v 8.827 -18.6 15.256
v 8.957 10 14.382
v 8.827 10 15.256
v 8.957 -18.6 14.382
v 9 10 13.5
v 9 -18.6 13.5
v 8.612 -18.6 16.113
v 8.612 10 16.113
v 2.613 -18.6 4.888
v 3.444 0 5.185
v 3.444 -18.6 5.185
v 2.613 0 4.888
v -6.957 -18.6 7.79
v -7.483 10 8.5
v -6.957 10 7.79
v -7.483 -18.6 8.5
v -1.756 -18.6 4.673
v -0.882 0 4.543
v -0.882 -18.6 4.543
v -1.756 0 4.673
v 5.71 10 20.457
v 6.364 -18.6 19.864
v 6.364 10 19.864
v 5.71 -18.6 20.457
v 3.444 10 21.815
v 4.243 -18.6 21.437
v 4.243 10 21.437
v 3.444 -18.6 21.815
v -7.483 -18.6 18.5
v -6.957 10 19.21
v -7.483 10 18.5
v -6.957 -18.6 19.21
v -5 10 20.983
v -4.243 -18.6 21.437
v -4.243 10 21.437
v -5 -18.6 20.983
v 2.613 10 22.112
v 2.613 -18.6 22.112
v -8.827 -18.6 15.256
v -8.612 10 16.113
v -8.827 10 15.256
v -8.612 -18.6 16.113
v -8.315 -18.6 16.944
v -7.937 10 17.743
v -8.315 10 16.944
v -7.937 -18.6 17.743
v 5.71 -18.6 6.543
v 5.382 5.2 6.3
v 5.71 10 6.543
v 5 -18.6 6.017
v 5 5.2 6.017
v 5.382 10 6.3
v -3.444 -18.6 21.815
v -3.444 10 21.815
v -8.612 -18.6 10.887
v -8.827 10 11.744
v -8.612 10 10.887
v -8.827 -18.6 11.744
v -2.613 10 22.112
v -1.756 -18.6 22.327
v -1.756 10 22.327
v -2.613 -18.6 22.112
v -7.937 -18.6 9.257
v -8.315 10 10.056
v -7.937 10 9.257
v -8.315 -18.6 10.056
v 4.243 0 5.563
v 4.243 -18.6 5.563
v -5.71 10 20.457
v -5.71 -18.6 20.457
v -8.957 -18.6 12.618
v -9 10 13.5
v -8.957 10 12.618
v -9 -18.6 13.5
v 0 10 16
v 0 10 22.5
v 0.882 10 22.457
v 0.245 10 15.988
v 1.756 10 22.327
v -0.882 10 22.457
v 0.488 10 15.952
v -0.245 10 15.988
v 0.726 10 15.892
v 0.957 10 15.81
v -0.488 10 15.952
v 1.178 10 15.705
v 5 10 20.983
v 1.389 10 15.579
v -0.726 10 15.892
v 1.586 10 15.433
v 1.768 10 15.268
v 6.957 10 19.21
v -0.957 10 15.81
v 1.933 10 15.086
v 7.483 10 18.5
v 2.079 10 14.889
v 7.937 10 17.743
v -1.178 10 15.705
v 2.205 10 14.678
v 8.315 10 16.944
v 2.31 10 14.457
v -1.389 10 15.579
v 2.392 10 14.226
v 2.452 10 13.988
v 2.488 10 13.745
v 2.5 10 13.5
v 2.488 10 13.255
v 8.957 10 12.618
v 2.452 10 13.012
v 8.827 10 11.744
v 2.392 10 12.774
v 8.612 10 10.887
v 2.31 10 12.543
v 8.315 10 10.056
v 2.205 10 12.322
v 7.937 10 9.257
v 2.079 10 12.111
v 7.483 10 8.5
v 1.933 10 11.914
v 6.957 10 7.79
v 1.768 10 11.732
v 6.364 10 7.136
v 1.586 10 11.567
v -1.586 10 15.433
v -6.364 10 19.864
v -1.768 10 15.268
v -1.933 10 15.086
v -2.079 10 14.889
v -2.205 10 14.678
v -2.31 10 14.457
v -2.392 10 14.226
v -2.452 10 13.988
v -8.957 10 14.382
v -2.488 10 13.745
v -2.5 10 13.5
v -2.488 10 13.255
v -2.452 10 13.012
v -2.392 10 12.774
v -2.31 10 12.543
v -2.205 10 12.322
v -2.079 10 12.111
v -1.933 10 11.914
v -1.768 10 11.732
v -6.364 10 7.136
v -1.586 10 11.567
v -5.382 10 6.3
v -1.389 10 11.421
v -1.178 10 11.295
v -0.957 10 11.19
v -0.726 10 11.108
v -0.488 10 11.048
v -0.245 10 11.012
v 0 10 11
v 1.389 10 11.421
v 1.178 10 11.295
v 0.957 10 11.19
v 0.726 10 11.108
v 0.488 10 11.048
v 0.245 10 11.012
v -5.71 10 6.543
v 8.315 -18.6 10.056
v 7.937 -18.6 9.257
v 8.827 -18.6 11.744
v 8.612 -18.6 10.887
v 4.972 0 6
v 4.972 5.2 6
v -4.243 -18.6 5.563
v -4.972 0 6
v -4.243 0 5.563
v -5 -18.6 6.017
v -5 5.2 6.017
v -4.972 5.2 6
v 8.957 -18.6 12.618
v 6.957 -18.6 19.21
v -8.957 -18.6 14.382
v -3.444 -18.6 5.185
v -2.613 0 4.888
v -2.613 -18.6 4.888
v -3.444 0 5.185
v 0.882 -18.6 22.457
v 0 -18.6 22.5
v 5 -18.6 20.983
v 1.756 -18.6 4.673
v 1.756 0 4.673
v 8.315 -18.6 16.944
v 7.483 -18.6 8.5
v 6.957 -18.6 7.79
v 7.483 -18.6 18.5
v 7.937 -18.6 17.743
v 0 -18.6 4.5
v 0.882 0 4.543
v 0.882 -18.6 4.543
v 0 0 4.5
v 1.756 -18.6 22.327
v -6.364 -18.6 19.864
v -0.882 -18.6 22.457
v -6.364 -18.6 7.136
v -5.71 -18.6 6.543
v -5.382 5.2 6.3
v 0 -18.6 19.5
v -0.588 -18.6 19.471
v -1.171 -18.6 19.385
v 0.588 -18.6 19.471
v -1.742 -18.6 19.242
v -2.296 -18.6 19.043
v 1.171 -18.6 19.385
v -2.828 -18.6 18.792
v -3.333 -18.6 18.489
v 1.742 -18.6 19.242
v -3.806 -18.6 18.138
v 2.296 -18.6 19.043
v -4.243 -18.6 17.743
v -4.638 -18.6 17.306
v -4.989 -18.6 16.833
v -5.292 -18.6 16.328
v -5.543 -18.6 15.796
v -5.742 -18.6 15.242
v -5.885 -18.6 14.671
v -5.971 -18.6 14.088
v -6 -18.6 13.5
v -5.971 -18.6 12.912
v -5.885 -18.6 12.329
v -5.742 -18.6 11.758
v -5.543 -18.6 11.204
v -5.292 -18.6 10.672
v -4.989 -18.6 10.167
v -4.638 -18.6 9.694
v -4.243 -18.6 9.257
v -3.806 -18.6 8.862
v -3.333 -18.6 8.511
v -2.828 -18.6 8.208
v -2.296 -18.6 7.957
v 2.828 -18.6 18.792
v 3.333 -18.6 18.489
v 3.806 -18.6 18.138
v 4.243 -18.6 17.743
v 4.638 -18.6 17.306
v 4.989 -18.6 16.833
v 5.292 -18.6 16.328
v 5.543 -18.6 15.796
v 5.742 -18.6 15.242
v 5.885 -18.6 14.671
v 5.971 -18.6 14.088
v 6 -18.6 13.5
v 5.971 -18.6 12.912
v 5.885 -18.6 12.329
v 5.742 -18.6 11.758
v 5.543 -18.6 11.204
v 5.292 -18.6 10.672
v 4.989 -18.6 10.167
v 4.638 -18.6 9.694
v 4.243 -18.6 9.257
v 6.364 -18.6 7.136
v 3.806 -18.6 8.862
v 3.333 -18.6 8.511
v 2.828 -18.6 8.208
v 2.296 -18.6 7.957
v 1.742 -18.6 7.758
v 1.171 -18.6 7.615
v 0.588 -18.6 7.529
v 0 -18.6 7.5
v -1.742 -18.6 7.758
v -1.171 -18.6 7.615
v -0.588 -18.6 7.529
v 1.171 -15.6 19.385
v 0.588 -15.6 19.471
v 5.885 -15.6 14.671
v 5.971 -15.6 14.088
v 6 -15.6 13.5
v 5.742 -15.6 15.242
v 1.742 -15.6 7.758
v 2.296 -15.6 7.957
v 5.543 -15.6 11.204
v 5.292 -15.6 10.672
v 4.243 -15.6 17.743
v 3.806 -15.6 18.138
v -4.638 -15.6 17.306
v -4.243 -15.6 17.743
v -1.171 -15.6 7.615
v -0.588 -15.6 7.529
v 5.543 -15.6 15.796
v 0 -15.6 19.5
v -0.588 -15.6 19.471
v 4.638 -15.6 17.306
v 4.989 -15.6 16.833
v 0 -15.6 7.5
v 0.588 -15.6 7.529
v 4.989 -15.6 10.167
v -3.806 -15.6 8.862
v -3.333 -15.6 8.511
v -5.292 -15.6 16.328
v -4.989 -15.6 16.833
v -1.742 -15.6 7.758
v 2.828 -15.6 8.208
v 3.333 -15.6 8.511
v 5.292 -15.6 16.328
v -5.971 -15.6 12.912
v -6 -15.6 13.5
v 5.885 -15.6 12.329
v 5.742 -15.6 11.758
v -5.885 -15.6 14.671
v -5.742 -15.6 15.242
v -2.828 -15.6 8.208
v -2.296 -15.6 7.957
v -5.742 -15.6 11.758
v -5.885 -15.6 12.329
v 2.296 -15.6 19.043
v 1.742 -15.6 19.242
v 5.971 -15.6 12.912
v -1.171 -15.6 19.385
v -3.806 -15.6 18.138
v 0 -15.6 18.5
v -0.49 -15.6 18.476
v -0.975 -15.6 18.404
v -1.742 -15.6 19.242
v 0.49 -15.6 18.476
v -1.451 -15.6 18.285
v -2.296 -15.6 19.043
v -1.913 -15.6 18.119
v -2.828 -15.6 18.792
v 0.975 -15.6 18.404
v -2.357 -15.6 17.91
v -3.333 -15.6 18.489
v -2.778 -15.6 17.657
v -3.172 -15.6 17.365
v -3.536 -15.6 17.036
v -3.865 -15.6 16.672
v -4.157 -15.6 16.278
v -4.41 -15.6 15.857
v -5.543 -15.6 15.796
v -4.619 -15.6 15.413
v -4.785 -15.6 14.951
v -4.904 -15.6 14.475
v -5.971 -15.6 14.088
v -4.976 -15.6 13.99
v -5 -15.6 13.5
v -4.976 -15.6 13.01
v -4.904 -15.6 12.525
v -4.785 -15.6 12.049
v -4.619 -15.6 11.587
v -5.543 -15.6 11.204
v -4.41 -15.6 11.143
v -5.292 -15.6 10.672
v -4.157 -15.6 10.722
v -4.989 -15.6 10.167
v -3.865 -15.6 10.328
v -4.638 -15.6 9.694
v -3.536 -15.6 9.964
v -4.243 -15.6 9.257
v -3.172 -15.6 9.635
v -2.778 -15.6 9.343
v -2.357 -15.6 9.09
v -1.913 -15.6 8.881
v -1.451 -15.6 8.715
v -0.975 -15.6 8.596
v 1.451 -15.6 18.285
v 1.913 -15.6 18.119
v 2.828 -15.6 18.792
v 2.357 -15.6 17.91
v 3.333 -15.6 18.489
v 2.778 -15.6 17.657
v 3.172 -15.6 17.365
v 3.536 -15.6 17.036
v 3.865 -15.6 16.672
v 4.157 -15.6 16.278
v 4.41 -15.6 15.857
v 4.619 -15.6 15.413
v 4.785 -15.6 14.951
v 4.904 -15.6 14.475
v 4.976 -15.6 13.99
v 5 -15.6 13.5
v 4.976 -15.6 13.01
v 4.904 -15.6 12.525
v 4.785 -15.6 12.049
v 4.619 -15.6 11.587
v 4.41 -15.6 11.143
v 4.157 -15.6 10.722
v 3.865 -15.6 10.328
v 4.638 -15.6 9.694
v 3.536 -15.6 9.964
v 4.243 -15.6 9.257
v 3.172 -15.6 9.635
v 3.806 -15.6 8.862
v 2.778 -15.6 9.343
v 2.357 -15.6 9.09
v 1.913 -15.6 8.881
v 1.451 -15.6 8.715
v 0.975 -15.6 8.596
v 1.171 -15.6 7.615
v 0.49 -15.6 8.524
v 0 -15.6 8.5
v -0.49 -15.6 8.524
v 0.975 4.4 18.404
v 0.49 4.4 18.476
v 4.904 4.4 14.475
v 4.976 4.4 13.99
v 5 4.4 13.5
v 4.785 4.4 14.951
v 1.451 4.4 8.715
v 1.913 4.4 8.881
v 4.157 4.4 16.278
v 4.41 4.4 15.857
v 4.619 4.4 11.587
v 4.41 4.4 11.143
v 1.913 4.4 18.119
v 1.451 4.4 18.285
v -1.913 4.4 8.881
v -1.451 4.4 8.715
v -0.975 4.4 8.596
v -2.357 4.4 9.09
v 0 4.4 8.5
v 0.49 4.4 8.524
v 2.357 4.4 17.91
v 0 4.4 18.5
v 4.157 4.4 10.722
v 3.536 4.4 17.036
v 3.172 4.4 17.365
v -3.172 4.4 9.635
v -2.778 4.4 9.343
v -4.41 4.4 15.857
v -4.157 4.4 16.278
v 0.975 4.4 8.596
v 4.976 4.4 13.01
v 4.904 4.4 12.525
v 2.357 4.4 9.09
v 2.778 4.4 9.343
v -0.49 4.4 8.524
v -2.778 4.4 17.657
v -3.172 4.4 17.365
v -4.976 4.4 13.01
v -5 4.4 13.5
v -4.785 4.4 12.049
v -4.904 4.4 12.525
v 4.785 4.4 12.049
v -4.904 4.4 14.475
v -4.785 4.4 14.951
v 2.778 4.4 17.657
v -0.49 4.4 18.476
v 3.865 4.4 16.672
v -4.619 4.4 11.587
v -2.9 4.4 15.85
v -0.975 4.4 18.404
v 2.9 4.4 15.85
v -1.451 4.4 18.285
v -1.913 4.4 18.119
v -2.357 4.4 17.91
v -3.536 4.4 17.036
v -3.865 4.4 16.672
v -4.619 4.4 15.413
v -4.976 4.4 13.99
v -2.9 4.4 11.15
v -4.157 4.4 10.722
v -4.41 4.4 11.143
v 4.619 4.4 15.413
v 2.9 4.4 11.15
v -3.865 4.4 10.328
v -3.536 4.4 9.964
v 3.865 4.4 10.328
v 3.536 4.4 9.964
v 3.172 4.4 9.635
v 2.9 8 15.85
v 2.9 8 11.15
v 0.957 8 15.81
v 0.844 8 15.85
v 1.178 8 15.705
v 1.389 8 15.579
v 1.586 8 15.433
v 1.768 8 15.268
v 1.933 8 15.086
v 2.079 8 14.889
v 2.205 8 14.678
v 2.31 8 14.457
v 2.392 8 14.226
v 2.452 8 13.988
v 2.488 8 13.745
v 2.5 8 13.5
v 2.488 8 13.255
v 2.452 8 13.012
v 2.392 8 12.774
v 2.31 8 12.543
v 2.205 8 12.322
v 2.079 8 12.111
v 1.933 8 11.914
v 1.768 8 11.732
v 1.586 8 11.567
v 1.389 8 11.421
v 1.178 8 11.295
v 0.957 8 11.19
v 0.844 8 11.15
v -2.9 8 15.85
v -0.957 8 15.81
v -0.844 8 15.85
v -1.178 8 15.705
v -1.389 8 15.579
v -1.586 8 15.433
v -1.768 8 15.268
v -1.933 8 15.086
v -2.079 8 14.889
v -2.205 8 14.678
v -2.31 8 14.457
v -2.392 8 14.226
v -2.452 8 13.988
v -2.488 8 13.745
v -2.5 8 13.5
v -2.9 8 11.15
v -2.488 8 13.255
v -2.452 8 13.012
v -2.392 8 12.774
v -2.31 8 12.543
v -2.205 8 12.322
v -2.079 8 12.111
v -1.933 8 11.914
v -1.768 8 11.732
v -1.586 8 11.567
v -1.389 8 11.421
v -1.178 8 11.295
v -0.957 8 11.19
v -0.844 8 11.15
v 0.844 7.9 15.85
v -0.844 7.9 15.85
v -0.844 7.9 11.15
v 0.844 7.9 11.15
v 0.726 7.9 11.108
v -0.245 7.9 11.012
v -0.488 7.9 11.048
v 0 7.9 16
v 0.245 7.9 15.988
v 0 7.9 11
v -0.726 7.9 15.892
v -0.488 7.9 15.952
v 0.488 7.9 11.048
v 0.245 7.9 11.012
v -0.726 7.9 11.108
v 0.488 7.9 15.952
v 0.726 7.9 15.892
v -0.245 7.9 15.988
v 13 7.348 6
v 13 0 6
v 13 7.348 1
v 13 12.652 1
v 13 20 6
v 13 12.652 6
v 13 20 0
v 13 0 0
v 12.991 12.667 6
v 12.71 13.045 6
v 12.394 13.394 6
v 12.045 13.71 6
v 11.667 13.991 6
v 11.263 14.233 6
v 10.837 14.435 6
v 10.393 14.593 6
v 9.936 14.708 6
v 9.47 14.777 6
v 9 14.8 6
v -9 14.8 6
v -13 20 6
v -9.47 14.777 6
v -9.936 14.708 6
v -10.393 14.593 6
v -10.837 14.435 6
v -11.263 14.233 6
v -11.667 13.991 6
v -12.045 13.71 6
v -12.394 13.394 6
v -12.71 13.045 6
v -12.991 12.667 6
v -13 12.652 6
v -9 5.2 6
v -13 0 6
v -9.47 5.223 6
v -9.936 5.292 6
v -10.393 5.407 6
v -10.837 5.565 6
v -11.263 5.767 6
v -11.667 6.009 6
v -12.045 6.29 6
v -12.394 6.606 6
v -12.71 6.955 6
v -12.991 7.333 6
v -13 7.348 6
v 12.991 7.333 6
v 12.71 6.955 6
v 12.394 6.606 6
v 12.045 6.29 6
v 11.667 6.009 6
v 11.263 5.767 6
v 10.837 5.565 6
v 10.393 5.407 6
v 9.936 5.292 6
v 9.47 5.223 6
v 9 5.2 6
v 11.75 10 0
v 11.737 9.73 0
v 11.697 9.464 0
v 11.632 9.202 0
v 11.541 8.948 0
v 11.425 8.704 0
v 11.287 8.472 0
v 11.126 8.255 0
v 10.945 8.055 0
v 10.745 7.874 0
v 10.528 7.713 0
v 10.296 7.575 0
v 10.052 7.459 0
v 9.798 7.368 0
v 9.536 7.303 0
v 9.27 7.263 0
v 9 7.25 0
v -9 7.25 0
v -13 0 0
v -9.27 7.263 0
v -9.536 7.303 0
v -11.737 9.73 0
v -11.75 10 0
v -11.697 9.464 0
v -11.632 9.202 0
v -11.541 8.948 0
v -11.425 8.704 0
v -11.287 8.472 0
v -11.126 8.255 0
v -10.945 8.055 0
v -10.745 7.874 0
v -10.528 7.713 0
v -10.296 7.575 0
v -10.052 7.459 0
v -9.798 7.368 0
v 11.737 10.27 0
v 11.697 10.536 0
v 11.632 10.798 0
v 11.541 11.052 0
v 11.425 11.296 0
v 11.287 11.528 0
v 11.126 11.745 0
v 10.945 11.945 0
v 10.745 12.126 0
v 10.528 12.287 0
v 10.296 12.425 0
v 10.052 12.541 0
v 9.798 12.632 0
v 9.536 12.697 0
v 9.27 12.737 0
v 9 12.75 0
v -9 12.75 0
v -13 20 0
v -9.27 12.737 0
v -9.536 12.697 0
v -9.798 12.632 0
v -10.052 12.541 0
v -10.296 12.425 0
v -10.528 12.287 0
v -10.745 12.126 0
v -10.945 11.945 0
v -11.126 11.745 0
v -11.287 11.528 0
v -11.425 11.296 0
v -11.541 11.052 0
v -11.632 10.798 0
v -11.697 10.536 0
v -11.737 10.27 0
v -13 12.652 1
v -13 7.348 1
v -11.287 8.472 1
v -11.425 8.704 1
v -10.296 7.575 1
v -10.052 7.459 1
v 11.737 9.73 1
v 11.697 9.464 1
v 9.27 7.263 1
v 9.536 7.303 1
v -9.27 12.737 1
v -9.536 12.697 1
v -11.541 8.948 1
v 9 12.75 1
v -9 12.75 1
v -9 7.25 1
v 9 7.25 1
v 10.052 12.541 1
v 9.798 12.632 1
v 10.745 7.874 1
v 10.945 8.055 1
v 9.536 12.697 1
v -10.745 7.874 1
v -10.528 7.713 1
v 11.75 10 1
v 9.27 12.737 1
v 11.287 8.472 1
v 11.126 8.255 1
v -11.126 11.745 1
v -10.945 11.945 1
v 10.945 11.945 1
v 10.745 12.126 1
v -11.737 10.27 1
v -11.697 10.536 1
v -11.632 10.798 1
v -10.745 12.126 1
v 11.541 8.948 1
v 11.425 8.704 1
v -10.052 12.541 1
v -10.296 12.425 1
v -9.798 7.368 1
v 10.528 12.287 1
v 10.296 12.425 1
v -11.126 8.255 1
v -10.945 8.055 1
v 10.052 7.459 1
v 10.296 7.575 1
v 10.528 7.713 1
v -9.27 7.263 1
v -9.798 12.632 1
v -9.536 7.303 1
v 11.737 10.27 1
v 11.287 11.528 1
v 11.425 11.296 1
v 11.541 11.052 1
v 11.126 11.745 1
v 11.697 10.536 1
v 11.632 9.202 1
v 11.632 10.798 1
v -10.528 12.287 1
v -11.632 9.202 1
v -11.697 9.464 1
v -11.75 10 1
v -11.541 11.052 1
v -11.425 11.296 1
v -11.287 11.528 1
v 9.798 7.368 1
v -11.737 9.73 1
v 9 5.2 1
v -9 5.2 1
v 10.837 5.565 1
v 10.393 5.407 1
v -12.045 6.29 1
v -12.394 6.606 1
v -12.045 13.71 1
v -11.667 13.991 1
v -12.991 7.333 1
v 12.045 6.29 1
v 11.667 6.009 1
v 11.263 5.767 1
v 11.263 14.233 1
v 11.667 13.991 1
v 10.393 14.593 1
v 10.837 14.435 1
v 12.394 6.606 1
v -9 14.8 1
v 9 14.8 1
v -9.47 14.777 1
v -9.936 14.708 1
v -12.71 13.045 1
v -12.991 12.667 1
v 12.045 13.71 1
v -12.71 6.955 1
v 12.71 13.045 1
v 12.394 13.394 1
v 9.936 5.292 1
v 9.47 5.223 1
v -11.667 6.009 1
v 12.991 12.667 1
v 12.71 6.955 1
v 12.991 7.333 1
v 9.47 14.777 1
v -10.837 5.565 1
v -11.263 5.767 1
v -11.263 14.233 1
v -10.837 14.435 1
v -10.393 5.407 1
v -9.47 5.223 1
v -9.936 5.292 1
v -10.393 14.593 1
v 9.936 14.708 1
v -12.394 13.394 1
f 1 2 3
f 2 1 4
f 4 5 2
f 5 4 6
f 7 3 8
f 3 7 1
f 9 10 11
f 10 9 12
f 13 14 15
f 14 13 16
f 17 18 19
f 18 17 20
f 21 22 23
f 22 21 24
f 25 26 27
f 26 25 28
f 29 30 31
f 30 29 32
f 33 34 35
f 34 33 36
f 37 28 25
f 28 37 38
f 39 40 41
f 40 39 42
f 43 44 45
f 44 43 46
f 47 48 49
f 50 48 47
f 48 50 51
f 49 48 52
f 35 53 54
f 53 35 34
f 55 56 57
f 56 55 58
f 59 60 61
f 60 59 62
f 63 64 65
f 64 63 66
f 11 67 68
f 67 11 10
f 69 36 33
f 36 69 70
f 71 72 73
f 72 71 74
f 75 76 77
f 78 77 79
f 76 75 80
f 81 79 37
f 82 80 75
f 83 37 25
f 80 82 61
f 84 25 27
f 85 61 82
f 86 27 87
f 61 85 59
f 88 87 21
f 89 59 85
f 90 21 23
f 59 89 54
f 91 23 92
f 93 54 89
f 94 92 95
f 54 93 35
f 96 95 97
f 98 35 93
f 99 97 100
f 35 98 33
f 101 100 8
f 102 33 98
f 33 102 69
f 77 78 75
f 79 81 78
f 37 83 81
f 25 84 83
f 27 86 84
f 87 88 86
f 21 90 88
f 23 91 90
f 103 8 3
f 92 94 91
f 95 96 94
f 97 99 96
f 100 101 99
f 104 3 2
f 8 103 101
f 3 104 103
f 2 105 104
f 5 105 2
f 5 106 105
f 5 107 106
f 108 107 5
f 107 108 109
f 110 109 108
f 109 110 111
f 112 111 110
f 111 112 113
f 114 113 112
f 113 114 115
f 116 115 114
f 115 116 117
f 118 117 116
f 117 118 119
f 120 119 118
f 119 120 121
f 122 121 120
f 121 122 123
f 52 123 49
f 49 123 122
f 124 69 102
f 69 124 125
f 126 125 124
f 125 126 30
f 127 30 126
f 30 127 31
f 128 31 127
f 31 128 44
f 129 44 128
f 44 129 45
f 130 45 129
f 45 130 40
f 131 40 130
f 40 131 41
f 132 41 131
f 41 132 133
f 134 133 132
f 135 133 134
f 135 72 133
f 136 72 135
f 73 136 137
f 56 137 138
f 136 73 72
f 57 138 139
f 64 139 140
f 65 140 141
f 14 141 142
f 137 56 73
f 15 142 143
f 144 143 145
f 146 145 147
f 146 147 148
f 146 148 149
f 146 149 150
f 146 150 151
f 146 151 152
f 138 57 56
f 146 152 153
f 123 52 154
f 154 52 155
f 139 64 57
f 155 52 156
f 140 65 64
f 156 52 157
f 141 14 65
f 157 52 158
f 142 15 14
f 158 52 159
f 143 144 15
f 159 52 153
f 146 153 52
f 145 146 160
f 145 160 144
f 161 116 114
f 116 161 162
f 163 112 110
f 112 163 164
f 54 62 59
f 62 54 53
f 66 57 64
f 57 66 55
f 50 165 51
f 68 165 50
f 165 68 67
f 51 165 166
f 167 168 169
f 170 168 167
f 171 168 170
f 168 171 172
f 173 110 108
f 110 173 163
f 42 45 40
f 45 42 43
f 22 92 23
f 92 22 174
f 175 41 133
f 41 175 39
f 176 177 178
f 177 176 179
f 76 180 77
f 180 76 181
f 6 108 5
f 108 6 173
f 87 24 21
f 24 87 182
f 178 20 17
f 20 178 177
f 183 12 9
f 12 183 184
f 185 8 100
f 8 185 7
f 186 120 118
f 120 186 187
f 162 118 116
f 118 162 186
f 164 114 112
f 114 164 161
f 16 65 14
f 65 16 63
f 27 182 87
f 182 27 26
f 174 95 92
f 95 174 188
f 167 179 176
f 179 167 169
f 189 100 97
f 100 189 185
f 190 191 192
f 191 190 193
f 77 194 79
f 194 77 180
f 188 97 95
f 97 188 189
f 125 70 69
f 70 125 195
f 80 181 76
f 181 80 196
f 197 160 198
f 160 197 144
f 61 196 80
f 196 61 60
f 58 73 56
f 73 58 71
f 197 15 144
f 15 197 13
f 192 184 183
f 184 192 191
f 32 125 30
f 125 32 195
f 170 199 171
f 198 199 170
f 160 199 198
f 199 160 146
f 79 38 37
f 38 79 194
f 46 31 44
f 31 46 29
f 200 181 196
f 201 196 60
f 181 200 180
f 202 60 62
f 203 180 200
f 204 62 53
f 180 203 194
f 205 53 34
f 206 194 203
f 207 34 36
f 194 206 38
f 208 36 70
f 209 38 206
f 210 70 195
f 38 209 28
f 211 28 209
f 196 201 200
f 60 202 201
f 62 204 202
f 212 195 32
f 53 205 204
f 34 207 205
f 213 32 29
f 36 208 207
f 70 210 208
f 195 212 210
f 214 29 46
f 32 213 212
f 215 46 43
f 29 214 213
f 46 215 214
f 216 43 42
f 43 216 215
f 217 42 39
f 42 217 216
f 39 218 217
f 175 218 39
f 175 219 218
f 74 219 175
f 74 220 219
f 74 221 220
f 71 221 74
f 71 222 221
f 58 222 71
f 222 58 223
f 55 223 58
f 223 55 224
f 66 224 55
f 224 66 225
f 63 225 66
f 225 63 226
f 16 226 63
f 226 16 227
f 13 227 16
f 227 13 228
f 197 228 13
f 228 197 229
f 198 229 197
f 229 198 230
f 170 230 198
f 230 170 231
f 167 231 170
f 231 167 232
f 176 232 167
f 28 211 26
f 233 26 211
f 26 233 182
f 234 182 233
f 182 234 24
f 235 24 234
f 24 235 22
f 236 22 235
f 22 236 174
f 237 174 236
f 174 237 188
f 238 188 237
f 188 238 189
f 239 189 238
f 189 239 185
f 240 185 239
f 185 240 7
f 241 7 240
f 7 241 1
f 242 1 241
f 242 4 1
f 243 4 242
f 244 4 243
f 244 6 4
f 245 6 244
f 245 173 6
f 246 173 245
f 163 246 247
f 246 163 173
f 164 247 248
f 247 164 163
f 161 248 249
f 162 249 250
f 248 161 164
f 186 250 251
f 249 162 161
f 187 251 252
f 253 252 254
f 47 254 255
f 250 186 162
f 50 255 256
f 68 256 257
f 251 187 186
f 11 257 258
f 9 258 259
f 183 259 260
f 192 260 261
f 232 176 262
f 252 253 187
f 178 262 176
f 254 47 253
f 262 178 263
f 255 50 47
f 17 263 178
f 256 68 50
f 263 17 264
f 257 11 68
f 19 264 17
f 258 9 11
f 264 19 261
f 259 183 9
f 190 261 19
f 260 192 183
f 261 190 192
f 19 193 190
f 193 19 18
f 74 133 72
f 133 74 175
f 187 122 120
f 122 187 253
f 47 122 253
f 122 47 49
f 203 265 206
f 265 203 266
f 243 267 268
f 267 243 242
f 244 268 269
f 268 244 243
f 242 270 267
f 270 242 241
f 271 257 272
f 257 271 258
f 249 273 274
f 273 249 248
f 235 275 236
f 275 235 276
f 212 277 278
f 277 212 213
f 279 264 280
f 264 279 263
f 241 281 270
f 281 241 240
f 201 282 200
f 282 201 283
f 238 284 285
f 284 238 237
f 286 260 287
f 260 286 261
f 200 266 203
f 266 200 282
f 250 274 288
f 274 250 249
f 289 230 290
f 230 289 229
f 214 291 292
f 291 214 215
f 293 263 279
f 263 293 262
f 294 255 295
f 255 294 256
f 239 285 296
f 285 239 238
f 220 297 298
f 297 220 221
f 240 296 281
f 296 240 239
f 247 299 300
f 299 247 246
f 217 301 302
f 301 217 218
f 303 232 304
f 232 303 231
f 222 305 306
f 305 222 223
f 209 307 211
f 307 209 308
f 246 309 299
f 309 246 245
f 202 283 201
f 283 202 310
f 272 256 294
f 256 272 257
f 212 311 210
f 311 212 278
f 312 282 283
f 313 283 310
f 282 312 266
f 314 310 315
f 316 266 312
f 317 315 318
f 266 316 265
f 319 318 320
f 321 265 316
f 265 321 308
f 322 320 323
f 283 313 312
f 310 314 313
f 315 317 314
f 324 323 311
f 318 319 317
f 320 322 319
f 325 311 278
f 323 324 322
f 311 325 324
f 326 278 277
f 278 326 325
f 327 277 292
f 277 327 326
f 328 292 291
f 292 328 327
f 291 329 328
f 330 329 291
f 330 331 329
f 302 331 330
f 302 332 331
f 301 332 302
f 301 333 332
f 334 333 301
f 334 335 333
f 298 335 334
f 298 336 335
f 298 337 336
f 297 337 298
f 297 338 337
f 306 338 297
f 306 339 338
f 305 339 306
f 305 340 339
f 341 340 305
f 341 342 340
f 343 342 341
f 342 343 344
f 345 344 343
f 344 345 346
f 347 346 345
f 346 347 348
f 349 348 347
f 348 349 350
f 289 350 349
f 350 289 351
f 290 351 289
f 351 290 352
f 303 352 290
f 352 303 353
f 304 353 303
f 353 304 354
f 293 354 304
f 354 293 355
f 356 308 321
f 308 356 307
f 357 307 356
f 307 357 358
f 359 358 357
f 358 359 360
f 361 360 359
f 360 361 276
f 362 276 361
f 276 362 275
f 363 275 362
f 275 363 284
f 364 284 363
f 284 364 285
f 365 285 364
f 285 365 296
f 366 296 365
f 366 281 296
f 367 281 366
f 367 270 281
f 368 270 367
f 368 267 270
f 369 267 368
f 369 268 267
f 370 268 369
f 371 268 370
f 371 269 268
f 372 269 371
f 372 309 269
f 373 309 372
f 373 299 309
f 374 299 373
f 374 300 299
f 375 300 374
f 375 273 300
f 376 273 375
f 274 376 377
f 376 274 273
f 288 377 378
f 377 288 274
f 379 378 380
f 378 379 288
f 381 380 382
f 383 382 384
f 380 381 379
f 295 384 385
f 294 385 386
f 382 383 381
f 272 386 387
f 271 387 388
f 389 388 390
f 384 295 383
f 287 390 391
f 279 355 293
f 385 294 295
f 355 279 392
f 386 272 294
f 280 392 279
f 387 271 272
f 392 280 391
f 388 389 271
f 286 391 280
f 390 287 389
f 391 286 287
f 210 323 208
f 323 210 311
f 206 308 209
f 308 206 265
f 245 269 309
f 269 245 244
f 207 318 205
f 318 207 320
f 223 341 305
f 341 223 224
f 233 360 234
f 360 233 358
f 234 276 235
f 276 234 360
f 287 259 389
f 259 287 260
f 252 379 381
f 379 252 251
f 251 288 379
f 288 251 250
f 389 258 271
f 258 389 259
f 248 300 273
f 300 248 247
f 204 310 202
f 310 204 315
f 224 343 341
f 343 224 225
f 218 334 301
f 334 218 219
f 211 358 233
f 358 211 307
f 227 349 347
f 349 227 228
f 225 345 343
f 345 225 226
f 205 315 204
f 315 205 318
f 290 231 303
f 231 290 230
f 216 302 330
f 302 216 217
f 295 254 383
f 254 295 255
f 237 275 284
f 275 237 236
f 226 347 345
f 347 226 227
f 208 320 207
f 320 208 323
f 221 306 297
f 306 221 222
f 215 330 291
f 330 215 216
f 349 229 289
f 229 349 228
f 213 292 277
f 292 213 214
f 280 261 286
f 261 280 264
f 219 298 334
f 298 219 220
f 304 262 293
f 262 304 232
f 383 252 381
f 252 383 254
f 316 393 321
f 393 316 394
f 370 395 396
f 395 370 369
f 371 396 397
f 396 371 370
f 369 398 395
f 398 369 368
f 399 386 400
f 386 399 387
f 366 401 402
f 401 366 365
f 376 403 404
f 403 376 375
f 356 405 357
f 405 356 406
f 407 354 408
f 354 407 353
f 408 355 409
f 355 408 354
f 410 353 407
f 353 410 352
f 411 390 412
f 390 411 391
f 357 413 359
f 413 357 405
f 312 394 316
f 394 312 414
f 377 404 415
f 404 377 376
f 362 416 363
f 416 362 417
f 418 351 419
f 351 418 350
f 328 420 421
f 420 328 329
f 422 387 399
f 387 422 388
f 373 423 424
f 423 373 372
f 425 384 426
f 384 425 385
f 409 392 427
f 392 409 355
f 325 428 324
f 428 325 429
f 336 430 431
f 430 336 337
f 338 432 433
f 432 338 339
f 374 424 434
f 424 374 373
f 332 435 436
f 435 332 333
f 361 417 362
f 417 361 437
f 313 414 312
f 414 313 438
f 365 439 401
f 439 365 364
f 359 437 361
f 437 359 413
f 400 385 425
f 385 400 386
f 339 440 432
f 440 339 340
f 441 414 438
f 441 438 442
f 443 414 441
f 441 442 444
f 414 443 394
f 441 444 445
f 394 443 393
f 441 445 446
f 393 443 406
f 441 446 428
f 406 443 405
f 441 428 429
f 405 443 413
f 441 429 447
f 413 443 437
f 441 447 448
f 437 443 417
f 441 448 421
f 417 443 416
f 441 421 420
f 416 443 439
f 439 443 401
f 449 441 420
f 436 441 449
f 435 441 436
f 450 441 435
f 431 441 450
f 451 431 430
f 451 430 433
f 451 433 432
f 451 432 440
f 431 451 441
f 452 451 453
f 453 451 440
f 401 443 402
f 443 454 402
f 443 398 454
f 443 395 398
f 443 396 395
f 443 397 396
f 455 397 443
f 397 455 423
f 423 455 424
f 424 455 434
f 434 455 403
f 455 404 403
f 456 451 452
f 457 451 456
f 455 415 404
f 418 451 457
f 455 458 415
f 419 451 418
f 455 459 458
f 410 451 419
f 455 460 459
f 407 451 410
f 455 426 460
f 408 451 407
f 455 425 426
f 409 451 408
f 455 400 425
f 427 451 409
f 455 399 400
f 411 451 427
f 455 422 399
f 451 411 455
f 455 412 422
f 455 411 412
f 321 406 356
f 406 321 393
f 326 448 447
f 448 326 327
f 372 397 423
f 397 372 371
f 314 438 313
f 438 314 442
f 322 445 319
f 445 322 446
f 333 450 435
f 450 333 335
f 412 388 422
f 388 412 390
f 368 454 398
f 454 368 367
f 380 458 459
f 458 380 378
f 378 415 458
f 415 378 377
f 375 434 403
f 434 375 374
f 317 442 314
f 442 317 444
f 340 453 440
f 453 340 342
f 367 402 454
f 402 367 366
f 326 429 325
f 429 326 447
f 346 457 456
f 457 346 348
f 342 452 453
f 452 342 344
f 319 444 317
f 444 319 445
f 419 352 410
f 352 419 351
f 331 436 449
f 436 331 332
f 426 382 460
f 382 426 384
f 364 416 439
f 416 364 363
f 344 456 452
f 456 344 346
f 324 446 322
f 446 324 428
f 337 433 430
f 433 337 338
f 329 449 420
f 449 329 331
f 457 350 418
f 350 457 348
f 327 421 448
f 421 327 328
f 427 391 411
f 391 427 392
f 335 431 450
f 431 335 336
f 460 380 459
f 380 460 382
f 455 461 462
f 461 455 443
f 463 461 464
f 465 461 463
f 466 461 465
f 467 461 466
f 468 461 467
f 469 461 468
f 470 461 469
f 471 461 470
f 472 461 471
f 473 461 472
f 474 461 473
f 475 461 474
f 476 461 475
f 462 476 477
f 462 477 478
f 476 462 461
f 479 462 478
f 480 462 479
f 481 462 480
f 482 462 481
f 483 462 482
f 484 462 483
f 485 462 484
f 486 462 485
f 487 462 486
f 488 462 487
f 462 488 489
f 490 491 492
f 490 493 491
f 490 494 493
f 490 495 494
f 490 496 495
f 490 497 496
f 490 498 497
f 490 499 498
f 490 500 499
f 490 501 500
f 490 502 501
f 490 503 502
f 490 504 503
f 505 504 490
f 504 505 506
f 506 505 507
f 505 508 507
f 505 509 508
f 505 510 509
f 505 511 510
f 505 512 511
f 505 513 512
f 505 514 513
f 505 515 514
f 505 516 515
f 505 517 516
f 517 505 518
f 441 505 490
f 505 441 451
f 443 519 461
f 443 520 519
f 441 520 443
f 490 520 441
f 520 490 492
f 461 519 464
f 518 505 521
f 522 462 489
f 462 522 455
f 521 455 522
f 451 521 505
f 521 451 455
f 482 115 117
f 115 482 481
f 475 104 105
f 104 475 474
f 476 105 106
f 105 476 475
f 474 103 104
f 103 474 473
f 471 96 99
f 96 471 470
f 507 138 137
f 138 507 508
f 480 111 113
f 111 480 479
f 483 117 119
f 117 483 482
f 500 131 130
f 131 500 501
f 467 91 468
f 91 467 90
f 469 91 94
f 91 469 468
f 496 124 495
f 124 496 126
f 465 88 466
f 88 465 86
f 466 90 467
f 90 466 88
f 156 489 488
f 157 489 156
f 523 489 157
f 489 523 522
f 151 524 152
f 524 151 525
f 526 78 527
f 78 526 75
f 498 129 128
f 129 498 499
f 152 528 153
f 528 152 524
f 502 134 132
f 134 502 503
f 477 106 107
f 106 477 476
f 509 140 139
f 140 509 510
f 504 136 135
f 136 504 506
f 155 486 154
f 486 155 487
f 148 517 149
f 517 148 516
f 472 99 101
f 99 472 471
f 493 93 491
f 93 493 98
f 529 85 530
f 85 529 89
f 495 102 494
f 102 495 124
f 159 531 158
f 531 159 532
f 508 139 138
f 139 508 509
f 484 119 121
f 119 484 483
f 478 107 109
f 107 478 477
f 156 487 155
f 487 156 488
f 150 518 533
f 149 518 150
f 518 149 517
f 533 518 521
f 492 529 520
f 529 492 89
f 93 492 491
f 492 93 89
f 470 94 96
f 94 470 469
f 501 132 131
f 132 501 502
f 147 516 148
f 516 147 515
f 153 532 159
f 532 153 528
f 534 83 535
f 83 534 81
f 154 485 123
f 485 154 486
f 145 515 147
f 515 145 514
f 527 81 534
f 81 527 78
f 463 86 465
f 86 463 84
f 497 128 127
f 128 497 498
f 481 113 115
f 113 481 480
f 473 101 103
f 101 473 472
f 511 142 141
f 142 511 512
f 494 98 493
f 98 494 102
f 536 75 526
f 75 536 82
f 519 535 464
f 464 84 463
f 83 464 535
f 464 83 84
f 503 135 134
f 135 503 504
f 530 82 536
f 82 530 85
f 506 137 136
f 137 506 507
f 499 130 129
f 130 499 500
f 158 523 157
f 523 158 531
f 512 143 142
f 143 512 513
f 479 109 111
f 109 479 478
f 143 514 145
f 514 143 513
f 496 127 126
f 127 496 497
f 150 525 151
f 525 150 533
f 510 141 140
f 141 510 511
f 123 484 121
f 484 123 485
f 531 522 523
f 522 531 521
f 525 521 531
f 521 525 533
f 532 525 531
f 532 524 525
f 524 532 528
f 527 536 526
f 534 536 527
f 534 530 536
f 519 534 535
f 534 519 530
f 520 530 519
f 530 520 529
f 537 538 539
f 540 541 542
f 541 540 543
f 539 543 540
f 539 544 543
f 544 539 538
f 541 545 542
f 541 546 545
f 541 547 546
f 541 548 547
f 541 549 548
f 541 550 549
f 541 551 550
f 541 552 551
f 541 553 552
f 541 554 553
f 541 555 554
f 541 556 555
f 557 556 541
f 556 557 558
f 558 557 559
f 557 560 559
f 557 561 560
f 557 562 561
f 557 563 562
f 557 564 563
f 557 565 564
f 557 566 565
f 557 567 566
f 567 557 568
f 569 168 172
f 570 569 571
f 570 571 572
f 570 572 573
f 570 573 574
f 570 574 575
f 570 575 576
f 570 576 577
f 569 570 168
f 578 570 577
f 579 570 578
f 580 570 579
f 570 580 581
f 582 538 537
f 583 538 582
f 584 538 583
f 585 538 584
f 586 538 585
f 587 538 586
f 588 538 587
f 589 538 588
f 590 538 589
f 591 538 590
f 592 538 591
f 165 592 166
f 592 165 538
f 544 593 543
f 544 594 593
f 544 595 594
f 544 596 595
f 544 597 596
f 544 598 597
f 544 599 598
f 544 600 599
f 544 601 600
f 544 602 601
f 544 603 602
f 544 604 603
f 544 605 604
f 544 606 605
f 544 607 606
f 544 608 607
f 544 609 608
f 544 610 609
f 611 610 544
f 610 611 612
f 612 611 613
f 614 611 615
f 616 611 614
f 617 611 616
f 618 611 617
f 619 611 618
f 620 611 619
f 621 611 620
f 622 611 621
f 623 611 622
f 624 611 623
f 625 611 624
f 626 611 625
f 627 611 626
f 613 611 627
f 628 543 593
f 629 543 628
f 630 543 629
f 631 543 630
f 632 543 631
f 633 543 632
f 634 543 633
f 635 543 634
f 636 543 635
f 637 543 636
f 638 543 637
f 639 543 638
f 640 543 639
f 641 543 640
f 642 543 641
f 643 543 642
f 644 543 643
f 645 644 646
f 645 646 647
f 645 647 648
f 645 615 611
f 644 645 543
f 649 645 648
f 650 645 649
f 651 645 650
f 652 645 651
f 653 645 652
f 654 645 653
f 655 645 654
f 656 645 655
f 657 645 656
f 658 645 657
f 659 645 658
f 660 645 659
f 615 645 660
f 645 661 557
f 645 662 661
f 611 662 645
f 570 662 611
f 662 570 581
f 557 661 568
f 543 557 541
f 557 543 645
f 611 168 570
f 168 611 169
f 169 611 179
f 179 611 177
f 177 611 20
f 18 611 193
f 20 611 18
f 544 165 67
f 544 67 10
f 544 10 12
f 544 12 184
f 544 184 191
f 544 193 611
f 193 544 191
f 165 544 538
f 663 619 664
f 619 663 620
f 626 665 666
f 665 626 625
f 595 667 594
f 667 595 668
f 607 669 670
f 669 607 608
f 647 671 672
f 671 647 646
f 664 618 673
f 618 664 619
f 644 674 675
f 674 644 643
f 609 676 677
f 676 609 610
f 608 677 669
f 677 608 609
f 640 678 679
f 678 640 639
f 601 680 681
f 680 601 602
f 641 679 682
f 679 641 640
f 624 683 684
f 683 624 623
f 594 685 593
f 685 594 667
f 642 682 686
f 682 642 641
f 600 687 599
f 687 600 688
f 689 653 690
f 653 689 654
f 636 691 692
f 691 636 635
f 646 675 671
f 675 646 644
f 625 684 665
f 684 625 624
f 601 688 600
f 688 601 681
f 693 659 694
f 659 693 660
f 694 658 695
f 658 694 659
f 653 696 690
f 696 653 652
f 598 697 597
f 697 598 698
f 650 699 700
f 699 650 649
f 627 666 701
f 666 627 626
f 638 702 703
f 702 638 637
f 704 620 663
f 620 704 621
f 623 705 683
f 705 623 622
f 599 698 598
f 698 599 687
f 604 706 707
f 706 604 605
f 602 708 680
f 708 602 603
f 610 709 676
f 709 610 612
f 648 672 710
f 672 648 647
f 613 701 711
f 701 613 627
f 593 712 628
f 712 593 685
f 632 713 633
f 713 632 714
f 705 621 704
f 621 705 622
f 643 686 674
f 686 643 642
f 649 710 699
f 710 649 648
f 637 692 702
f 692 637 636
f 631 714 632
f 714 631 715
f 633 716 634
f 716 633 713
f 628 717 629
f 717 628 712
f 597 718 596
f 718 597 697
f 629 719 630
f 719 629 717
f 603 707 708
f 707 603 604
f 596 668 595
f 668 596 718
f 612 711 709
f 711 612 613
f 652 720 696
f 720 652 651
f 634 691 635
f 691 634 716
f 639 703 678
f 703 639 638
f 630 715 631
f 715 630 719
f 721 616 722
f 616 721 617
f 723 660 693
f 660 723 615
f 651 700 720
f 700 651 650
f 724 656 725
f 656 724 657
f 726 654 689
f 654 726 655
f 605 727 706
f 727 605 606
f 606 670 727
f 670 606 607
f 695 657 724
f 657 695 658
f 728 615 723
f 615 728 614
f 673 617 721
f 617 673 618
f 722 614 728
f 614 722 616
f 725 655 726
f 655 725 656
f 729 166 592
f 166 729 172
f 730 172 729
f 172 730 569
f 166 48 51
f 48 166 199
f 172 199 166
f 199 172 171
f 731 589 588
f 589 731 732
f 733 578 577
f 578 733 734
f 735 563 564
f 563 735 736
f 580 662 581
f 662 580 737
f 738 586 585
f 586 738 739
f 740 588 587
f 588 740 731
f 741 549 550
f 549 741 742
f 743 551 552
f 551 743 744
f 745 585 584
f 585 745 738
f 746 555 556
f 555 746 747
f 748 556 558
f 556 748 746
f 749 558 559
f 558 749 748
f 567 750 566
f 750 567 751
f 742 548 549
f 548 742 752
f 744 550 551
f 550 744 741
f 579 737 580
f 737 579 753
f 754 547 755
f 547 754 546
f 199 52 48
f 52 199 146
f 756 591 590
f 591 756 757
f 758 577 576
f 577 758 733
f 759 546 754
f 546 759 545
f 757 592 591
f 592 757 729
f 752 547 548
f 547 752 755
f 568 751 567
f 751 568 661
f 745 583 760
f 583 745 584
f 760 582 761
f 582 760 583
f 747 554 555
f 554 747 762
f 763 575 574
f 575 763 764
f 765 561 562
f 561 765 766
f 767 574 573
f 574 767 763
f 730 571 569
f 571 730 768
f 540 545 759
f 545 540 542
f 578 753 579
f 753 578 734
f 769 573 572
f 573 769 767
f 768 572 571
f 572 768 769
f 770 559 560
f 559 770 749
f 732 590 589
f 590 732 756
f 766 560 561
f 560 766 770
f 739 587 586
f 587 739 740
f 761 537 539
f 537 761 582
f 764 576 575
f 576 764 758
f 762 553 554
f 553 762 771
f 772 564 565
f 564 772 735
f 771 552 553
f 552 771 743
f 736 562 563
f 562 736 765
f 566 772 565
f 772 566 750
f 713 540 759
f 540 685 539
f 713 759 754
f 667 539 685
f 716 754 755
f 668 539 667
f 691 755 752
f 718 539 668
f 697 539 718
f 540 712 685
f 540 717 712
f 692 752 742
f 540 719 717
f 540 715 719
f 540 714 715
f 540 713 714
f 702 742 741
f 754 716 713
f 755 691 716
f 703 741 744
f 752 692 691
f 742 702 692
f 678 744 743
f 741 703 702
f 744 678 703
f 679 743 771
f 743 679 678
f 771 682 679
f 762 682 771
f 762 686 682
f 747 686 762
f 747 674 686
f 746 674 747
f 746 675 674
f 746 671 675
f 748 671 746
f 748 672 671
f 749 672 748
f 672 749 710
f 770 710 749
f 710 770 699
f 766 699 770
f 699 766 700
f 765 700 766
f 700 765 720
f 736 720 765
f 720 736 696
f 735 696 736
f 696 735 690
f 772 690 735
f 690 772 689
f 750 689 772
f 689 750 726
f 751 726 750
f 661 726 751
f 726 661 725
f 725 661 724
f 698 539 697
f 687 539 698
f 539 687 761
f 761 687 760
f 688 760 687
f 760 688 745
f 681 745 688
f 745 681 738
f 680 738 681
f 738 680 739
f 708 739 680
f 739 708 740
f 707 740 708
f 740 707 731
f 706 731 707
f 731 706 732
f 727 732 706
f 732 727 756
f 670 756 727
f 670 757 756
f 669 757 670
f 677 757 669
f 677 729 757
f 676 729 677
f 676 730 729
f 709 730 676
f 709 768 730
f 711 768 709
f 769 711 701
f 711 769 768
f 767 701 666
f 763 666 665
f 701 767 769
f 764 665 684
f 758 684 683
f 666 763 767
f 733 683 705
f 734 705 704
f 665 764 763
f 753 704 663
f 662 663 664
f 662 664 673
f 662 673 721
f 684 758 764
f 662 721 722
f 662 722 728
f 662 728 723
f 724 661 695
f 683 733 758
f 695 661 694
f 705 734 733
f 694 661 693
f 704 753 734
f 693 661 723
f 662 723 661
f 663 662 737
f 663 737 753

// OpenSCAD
// file: params.scad
// =============================================================================
//  BUGLOCK printed-bracket parameters
//  Every structural number here traces to docs/laser-fly-turret-design.md §4.5.
//  Units: millimetres. Target printer: Bambu Lab P1S (256^3 bed, enclosed).
//  Material: PETG minimum, ASA preferred near the laser.  NEVER PLA (§4.5 C3).
// =============================================================================

$fn = 64;                 // curve smoothness for render/export

// ---- general print process (P1S, 0.4 mm nozzle) --------------------------
wall        = 3.2;        // ~8 perimeters — stiffness governs, not strength
gen_clr     = 0.20;       // clearance between mating printed features

// ---- 2020 / 2040 aluminum extrusion interface ----------------------------
ext_w       = 20;         // 2020 profile face width (rail top the foot sits on)
m5_clear    = 5.5;        // clearance hole for an M5 bolt into a T-nut
m5_head     = 9.6;        // M5 socket-head cap dia (counterbore)
m5_head_h   = 5.0;        // M5 head height (counterbore depth)

// ---- heat-set brass inserts (melt-in hole diameters) ---------------------
// Verify against YOUR inserts; these are typical for CNC Kitchen / generic.
ins_m2_d    = 3.2;  ins_m2_h = 4.0;
ins_m3_d    = 4.0;  ins_m3_h = 6.0;
ins_m4_d    = 5.7;  ins_m4_h = 8.0;

// =============================================================================
//  GALVO PAD  — §4.5 Constraint 1 (static stiffness)
//  Cantilever calc: slope theta = P*L^2/(2*E*I), I = b*h^3/12, so theta ~ 1/h^3.
//  Under the ~4 N scanner block a >=12 mm pad flexes ~0.35 mrad (vs 1.17 mrad at
//  8 mm) — inside the 0.5 mrad frame budget. The pad is a SHORT SOLID pedestal
//  (load in compression, short moment arm), not a slender arm.
// =============================================================================
galvo_ped_h      = 16;    // pedestal height — keep SHORT (short moment arm)
galvo_ped_h_max  = 20;    // do not exceed: taller = longer lever = more drift
galvo_pad_t_min  = 12;    // informational: min effective load-path thickness

// Footprint of YOUR galvo scanner block — MEASURE and edit these two:
galvo_block_w    = 66;    // block width  (X)
galvo_block_d    = 40;    // block depth  (Y)

// Galvo block bolt pattern — MEASURE your kit (most 20-30 kpps sets are M4):
galvo_bolt_dx    = 50;    // bolt spacing across X
galvo_bolt_dy    = 28;    // bolt spacing across Y
galvo_bolt_ins   = ins_m4_d;
galvo_bolt_ins_h = ins_m4_h;

galvo_margin     = 11;    // pad border beyond the block (room for hold-downs)
galvo_hold_edge  = 7;     // hold-down bolt inset from the pad edge
cable_slot_w     = 12;    // cable relief channel width
cable_slot_h     = 5;     // cable relief channel height (from base up)

// =============================================================================
//  CAMERA MOUNT — §4.5 Constraint 2 & 4
//  Baseline (60 mm) is carried on the ALUMINUM rail, not plastic: the foot has a
//  SLOT so you slide each camera to an exact baseline, then lock it. Print two.
//  PCB is captured in a lipped pocket (a datum) so it re-seats repeatably.
// =============================================================================
// Raspberry Pi Camera v2 (IMX219) board — MEASURE yours; boards vary slightly:
cam_pcb_w        = 25.0;
cam_pcb_h        = 24.0;
cam_pcb_t        = 1.6;
cam_pocket_clr   = 0.35;  // pocket oversize so the PCB drops in cleanly

cam_lip_w        = 3.0;   // pocket wall/lip width around the PCB
cam_lip_front    = 2.0;   // front retaining lip that traps the PCB
cam_window_d     = 16.0;  // front opening — clears the lens & its field of view
cam_ribbon_w     = 17.0;  // FFC ribbon exit slot at the pocket bottom

cam_foot_len     = 40;    // foot length along the rail (X)
cam_base_t       = 6;     // foot thickness
cam_plate_t      = 6;     // vertical plate thickness (>= ins_m2_h so inserts fit)
cam_plate_h      = 40;    // vertical plate height
cam_plate_w      = 34;    // vertical plate width

cam_slot_len     = 30;    // baseline-adjust travel (slotted foot hole)
cam_toe_in_deg   = 0;     // 0 = parallel optics (rectified stereo). small toe ok
cam_use_screws   = true;  // M2 heat-set inserts to bolt the PCB down
cam_hole_dx      = 21;    // PCB mount-hole horizontal spacing — MEASURE yours
cam_hole_dz      = 0;     // vertical offset of the mount holes from pocket center

cam_center_z     = cam_base_t + cam_plate_h / 2;   // PCB centre height (derived)

// =============================================================================
//  ELECTRONICS TRAY — holds the Jetson Orin Nano + the MCP4922/op-amp protoboard
//  Not stiffness-critical (no optics on it), so it's a light plate with standoff
//  bosses. Bolts to the frame with M5 T-nut bolts. MEASURE your board hole
//  patterns — the Jetson dev-kit pattern below is nominal.
// =============================================================================
tray_w           = 172;   // tray plate width  (X)
tray_d           = 108;   // tray plate depth  (Y)
tray_t           = 4;     // tray plate thickness
tray_standoff_h  = 6;     // standoff height (clears solder/leads under boards)
tray_standoff_d  = 7.5;   // standoff outer diameter
tray_edge        = 9;     // frame-bolt inset from the tray edge

// Jetson Orin Nano dev-kit carrier mounting holes (nominal — MEASURE yours):
tray_jetson_dx   = 86;    // hole spacing X
tray_jetson_dy   = 58;    // hole spacing Y
tray_jetson_cx   = -34;   // pattern centre offset on the tray (X)
tray_jetson_ins  = ins_m3_d;
tray_jetson_ins_h= ins_m3_h;

// Aux protoboard (MCP4922 DAC + op-amp level-shift) mounting holes:
tray_aux_dx      = 45;
tray_aux_dy      = 35;
tray_aux_cx      = 56;    // pattern centre offset on the tray (X)
tray_aux_ins     = ins_m3_d;
tray_aux_ins_h   = ins_m3_h;

// =============================================================================
//  PHOTODIODE / LENS HOLDER — the wing-beat sensor front-end (§3.2)
//  A short barrel: a collecting lens up front, the photodiode at its focal
//  distance behind it, on a slotted foot that clamps to the rail and aims at the
//  detection volume. Optics are cheap and non-critical — this just gathers flux.
// =============================================================================
pd_lens_od       = 12.0;  // collecting lens outer diameter (MEASURE)
pd_lens_t        = 3.0;   // lens seat depth (front counterbore)
pd_focal         = 20.0;  // lens focal length ≈ lens-to-photodiode distance
pd_barrel_wall   = 3.0;   // barrel wall thickness
pd_body_w        = 5.8;   // BPW34 body pocket width  (MEASURE)
pd_body_h        = 4.7;   // BPW34 body pocket height
pd_body_t        = 3.6;   // BPW34 body pocket depth
pd_lead_d        = 5.0;   // rear clearance for leads / wiring
pd_foot_len      = 26;    // foot length along the rail
pd_base_t        = 6;     // foot thickness
pd_slot_len      = 18;    // aim-position adjust travel on the rail
pd_aim_deg       = 0;     // barrel tilt toward the volume (0 = level, -Y look)
// main file
// =============================================================================
//  BUGLOCK — photodiode / lens holder  (wing-beat sensor front-end, §3.2)
//  A short barrel: a collecting lens seats in the front, the BPW34 photodiode
//  sits at the lens focal distance behind it, on a slotted foot that clamps to
//  the rail and aims at the detection volume (lens looks down the -Y axis).
//  Optics are cheap and non-critical — this only gathers flux for the FFT gate.
//  Print PETG/ASA. Not compile-checked in-sandbox — verify before printing.
// =============================================================================
include <params.scad>

barrel_od  = pd_lens_od + 2 * pd_barrel_wall;
barrel_len = pd_lens_t + pd_focal + pd_body_t + 2;   // +2 = rear wall
aperture_d = pd_lens_od - 2;

// Barrel built along +Z: z=0 is the rear wall, z=barrel_len is the lens face.
module pd_barrel() {
    difference() {
        cylinder(d = barrel_od, h = barrel_len);

        // front lens seat (press-fit counterbore)
        translate([0, 0, barrel_len - pd_lens_t])
            cylinder(d = pd_lens_od, h = pd_lens_t + 0.1);

        // internal light path (aperture tube) from behind the lens to the pocket
        translate([0, 0, 2 + pd_body_t])
            cylinder(d = aperture_d, h = barrel_len - pd_lens_t - (2 + pd_body_t) + 0.1);

        // photodiode body pocket (rectangular), just inside the rear wall
        translate([-pd_body_w / 2, -pd_body_h / 2, 2])
            cube([pd_body_w, pd_body_h, pd_body_t + 0.1]);

        // rear lead / wire clearance through the back wall
        translate([0, 0, -0.1]) cylinder(d = pd_lead_d, h = 2 + 0.2);
    }
}

module pd_foot_slot() {
    translate([0, ext_w / 2, -0.1]) {
        hull() {
            translate([-pd_slot_len / 2, 0, 0]) cylinder(d = m5_clear, h = pd_base_t + 0.2);
            translate([ pd_slot_len / 2, 0, 0]) cylinder(d = m5_clear, h = pd_base_t + 0.2);
        }
        translate([0, 0, pd_base_t - m5_head_h + 0.1])
            hull() {
                translate([-pd_slot_len / 2, 0, 0]) cylinder(d = m5_head, h = m5_head_h + 0.3);
                translate([ pd_slot_len / 2, 0, 0]) cylinder(d = m5_head, h = m5_head_h + 0.3);
            }
    }
}

module photodiode_holder() {
    z0 = pd_base_t + barrel_od / 2 - 1.5;   // barrel axis height (embed into foot)
    difference() {
        union() {
            translate([-pd_foot_len / 2, 0, 0]) cube([pd_foot_len, ext_w, pd_base_t]);
            translate([0, ext_w / 2, z0])
                rotate([pd_aim_deg, 0, 0])   // aim up/down toward the volume
                    rotate([90, 0, 0])       // point the barrel down the -Y axis
                        pd_barrel();
        }
        pd_foot_slot();
    }
}

photodiode_holder();
